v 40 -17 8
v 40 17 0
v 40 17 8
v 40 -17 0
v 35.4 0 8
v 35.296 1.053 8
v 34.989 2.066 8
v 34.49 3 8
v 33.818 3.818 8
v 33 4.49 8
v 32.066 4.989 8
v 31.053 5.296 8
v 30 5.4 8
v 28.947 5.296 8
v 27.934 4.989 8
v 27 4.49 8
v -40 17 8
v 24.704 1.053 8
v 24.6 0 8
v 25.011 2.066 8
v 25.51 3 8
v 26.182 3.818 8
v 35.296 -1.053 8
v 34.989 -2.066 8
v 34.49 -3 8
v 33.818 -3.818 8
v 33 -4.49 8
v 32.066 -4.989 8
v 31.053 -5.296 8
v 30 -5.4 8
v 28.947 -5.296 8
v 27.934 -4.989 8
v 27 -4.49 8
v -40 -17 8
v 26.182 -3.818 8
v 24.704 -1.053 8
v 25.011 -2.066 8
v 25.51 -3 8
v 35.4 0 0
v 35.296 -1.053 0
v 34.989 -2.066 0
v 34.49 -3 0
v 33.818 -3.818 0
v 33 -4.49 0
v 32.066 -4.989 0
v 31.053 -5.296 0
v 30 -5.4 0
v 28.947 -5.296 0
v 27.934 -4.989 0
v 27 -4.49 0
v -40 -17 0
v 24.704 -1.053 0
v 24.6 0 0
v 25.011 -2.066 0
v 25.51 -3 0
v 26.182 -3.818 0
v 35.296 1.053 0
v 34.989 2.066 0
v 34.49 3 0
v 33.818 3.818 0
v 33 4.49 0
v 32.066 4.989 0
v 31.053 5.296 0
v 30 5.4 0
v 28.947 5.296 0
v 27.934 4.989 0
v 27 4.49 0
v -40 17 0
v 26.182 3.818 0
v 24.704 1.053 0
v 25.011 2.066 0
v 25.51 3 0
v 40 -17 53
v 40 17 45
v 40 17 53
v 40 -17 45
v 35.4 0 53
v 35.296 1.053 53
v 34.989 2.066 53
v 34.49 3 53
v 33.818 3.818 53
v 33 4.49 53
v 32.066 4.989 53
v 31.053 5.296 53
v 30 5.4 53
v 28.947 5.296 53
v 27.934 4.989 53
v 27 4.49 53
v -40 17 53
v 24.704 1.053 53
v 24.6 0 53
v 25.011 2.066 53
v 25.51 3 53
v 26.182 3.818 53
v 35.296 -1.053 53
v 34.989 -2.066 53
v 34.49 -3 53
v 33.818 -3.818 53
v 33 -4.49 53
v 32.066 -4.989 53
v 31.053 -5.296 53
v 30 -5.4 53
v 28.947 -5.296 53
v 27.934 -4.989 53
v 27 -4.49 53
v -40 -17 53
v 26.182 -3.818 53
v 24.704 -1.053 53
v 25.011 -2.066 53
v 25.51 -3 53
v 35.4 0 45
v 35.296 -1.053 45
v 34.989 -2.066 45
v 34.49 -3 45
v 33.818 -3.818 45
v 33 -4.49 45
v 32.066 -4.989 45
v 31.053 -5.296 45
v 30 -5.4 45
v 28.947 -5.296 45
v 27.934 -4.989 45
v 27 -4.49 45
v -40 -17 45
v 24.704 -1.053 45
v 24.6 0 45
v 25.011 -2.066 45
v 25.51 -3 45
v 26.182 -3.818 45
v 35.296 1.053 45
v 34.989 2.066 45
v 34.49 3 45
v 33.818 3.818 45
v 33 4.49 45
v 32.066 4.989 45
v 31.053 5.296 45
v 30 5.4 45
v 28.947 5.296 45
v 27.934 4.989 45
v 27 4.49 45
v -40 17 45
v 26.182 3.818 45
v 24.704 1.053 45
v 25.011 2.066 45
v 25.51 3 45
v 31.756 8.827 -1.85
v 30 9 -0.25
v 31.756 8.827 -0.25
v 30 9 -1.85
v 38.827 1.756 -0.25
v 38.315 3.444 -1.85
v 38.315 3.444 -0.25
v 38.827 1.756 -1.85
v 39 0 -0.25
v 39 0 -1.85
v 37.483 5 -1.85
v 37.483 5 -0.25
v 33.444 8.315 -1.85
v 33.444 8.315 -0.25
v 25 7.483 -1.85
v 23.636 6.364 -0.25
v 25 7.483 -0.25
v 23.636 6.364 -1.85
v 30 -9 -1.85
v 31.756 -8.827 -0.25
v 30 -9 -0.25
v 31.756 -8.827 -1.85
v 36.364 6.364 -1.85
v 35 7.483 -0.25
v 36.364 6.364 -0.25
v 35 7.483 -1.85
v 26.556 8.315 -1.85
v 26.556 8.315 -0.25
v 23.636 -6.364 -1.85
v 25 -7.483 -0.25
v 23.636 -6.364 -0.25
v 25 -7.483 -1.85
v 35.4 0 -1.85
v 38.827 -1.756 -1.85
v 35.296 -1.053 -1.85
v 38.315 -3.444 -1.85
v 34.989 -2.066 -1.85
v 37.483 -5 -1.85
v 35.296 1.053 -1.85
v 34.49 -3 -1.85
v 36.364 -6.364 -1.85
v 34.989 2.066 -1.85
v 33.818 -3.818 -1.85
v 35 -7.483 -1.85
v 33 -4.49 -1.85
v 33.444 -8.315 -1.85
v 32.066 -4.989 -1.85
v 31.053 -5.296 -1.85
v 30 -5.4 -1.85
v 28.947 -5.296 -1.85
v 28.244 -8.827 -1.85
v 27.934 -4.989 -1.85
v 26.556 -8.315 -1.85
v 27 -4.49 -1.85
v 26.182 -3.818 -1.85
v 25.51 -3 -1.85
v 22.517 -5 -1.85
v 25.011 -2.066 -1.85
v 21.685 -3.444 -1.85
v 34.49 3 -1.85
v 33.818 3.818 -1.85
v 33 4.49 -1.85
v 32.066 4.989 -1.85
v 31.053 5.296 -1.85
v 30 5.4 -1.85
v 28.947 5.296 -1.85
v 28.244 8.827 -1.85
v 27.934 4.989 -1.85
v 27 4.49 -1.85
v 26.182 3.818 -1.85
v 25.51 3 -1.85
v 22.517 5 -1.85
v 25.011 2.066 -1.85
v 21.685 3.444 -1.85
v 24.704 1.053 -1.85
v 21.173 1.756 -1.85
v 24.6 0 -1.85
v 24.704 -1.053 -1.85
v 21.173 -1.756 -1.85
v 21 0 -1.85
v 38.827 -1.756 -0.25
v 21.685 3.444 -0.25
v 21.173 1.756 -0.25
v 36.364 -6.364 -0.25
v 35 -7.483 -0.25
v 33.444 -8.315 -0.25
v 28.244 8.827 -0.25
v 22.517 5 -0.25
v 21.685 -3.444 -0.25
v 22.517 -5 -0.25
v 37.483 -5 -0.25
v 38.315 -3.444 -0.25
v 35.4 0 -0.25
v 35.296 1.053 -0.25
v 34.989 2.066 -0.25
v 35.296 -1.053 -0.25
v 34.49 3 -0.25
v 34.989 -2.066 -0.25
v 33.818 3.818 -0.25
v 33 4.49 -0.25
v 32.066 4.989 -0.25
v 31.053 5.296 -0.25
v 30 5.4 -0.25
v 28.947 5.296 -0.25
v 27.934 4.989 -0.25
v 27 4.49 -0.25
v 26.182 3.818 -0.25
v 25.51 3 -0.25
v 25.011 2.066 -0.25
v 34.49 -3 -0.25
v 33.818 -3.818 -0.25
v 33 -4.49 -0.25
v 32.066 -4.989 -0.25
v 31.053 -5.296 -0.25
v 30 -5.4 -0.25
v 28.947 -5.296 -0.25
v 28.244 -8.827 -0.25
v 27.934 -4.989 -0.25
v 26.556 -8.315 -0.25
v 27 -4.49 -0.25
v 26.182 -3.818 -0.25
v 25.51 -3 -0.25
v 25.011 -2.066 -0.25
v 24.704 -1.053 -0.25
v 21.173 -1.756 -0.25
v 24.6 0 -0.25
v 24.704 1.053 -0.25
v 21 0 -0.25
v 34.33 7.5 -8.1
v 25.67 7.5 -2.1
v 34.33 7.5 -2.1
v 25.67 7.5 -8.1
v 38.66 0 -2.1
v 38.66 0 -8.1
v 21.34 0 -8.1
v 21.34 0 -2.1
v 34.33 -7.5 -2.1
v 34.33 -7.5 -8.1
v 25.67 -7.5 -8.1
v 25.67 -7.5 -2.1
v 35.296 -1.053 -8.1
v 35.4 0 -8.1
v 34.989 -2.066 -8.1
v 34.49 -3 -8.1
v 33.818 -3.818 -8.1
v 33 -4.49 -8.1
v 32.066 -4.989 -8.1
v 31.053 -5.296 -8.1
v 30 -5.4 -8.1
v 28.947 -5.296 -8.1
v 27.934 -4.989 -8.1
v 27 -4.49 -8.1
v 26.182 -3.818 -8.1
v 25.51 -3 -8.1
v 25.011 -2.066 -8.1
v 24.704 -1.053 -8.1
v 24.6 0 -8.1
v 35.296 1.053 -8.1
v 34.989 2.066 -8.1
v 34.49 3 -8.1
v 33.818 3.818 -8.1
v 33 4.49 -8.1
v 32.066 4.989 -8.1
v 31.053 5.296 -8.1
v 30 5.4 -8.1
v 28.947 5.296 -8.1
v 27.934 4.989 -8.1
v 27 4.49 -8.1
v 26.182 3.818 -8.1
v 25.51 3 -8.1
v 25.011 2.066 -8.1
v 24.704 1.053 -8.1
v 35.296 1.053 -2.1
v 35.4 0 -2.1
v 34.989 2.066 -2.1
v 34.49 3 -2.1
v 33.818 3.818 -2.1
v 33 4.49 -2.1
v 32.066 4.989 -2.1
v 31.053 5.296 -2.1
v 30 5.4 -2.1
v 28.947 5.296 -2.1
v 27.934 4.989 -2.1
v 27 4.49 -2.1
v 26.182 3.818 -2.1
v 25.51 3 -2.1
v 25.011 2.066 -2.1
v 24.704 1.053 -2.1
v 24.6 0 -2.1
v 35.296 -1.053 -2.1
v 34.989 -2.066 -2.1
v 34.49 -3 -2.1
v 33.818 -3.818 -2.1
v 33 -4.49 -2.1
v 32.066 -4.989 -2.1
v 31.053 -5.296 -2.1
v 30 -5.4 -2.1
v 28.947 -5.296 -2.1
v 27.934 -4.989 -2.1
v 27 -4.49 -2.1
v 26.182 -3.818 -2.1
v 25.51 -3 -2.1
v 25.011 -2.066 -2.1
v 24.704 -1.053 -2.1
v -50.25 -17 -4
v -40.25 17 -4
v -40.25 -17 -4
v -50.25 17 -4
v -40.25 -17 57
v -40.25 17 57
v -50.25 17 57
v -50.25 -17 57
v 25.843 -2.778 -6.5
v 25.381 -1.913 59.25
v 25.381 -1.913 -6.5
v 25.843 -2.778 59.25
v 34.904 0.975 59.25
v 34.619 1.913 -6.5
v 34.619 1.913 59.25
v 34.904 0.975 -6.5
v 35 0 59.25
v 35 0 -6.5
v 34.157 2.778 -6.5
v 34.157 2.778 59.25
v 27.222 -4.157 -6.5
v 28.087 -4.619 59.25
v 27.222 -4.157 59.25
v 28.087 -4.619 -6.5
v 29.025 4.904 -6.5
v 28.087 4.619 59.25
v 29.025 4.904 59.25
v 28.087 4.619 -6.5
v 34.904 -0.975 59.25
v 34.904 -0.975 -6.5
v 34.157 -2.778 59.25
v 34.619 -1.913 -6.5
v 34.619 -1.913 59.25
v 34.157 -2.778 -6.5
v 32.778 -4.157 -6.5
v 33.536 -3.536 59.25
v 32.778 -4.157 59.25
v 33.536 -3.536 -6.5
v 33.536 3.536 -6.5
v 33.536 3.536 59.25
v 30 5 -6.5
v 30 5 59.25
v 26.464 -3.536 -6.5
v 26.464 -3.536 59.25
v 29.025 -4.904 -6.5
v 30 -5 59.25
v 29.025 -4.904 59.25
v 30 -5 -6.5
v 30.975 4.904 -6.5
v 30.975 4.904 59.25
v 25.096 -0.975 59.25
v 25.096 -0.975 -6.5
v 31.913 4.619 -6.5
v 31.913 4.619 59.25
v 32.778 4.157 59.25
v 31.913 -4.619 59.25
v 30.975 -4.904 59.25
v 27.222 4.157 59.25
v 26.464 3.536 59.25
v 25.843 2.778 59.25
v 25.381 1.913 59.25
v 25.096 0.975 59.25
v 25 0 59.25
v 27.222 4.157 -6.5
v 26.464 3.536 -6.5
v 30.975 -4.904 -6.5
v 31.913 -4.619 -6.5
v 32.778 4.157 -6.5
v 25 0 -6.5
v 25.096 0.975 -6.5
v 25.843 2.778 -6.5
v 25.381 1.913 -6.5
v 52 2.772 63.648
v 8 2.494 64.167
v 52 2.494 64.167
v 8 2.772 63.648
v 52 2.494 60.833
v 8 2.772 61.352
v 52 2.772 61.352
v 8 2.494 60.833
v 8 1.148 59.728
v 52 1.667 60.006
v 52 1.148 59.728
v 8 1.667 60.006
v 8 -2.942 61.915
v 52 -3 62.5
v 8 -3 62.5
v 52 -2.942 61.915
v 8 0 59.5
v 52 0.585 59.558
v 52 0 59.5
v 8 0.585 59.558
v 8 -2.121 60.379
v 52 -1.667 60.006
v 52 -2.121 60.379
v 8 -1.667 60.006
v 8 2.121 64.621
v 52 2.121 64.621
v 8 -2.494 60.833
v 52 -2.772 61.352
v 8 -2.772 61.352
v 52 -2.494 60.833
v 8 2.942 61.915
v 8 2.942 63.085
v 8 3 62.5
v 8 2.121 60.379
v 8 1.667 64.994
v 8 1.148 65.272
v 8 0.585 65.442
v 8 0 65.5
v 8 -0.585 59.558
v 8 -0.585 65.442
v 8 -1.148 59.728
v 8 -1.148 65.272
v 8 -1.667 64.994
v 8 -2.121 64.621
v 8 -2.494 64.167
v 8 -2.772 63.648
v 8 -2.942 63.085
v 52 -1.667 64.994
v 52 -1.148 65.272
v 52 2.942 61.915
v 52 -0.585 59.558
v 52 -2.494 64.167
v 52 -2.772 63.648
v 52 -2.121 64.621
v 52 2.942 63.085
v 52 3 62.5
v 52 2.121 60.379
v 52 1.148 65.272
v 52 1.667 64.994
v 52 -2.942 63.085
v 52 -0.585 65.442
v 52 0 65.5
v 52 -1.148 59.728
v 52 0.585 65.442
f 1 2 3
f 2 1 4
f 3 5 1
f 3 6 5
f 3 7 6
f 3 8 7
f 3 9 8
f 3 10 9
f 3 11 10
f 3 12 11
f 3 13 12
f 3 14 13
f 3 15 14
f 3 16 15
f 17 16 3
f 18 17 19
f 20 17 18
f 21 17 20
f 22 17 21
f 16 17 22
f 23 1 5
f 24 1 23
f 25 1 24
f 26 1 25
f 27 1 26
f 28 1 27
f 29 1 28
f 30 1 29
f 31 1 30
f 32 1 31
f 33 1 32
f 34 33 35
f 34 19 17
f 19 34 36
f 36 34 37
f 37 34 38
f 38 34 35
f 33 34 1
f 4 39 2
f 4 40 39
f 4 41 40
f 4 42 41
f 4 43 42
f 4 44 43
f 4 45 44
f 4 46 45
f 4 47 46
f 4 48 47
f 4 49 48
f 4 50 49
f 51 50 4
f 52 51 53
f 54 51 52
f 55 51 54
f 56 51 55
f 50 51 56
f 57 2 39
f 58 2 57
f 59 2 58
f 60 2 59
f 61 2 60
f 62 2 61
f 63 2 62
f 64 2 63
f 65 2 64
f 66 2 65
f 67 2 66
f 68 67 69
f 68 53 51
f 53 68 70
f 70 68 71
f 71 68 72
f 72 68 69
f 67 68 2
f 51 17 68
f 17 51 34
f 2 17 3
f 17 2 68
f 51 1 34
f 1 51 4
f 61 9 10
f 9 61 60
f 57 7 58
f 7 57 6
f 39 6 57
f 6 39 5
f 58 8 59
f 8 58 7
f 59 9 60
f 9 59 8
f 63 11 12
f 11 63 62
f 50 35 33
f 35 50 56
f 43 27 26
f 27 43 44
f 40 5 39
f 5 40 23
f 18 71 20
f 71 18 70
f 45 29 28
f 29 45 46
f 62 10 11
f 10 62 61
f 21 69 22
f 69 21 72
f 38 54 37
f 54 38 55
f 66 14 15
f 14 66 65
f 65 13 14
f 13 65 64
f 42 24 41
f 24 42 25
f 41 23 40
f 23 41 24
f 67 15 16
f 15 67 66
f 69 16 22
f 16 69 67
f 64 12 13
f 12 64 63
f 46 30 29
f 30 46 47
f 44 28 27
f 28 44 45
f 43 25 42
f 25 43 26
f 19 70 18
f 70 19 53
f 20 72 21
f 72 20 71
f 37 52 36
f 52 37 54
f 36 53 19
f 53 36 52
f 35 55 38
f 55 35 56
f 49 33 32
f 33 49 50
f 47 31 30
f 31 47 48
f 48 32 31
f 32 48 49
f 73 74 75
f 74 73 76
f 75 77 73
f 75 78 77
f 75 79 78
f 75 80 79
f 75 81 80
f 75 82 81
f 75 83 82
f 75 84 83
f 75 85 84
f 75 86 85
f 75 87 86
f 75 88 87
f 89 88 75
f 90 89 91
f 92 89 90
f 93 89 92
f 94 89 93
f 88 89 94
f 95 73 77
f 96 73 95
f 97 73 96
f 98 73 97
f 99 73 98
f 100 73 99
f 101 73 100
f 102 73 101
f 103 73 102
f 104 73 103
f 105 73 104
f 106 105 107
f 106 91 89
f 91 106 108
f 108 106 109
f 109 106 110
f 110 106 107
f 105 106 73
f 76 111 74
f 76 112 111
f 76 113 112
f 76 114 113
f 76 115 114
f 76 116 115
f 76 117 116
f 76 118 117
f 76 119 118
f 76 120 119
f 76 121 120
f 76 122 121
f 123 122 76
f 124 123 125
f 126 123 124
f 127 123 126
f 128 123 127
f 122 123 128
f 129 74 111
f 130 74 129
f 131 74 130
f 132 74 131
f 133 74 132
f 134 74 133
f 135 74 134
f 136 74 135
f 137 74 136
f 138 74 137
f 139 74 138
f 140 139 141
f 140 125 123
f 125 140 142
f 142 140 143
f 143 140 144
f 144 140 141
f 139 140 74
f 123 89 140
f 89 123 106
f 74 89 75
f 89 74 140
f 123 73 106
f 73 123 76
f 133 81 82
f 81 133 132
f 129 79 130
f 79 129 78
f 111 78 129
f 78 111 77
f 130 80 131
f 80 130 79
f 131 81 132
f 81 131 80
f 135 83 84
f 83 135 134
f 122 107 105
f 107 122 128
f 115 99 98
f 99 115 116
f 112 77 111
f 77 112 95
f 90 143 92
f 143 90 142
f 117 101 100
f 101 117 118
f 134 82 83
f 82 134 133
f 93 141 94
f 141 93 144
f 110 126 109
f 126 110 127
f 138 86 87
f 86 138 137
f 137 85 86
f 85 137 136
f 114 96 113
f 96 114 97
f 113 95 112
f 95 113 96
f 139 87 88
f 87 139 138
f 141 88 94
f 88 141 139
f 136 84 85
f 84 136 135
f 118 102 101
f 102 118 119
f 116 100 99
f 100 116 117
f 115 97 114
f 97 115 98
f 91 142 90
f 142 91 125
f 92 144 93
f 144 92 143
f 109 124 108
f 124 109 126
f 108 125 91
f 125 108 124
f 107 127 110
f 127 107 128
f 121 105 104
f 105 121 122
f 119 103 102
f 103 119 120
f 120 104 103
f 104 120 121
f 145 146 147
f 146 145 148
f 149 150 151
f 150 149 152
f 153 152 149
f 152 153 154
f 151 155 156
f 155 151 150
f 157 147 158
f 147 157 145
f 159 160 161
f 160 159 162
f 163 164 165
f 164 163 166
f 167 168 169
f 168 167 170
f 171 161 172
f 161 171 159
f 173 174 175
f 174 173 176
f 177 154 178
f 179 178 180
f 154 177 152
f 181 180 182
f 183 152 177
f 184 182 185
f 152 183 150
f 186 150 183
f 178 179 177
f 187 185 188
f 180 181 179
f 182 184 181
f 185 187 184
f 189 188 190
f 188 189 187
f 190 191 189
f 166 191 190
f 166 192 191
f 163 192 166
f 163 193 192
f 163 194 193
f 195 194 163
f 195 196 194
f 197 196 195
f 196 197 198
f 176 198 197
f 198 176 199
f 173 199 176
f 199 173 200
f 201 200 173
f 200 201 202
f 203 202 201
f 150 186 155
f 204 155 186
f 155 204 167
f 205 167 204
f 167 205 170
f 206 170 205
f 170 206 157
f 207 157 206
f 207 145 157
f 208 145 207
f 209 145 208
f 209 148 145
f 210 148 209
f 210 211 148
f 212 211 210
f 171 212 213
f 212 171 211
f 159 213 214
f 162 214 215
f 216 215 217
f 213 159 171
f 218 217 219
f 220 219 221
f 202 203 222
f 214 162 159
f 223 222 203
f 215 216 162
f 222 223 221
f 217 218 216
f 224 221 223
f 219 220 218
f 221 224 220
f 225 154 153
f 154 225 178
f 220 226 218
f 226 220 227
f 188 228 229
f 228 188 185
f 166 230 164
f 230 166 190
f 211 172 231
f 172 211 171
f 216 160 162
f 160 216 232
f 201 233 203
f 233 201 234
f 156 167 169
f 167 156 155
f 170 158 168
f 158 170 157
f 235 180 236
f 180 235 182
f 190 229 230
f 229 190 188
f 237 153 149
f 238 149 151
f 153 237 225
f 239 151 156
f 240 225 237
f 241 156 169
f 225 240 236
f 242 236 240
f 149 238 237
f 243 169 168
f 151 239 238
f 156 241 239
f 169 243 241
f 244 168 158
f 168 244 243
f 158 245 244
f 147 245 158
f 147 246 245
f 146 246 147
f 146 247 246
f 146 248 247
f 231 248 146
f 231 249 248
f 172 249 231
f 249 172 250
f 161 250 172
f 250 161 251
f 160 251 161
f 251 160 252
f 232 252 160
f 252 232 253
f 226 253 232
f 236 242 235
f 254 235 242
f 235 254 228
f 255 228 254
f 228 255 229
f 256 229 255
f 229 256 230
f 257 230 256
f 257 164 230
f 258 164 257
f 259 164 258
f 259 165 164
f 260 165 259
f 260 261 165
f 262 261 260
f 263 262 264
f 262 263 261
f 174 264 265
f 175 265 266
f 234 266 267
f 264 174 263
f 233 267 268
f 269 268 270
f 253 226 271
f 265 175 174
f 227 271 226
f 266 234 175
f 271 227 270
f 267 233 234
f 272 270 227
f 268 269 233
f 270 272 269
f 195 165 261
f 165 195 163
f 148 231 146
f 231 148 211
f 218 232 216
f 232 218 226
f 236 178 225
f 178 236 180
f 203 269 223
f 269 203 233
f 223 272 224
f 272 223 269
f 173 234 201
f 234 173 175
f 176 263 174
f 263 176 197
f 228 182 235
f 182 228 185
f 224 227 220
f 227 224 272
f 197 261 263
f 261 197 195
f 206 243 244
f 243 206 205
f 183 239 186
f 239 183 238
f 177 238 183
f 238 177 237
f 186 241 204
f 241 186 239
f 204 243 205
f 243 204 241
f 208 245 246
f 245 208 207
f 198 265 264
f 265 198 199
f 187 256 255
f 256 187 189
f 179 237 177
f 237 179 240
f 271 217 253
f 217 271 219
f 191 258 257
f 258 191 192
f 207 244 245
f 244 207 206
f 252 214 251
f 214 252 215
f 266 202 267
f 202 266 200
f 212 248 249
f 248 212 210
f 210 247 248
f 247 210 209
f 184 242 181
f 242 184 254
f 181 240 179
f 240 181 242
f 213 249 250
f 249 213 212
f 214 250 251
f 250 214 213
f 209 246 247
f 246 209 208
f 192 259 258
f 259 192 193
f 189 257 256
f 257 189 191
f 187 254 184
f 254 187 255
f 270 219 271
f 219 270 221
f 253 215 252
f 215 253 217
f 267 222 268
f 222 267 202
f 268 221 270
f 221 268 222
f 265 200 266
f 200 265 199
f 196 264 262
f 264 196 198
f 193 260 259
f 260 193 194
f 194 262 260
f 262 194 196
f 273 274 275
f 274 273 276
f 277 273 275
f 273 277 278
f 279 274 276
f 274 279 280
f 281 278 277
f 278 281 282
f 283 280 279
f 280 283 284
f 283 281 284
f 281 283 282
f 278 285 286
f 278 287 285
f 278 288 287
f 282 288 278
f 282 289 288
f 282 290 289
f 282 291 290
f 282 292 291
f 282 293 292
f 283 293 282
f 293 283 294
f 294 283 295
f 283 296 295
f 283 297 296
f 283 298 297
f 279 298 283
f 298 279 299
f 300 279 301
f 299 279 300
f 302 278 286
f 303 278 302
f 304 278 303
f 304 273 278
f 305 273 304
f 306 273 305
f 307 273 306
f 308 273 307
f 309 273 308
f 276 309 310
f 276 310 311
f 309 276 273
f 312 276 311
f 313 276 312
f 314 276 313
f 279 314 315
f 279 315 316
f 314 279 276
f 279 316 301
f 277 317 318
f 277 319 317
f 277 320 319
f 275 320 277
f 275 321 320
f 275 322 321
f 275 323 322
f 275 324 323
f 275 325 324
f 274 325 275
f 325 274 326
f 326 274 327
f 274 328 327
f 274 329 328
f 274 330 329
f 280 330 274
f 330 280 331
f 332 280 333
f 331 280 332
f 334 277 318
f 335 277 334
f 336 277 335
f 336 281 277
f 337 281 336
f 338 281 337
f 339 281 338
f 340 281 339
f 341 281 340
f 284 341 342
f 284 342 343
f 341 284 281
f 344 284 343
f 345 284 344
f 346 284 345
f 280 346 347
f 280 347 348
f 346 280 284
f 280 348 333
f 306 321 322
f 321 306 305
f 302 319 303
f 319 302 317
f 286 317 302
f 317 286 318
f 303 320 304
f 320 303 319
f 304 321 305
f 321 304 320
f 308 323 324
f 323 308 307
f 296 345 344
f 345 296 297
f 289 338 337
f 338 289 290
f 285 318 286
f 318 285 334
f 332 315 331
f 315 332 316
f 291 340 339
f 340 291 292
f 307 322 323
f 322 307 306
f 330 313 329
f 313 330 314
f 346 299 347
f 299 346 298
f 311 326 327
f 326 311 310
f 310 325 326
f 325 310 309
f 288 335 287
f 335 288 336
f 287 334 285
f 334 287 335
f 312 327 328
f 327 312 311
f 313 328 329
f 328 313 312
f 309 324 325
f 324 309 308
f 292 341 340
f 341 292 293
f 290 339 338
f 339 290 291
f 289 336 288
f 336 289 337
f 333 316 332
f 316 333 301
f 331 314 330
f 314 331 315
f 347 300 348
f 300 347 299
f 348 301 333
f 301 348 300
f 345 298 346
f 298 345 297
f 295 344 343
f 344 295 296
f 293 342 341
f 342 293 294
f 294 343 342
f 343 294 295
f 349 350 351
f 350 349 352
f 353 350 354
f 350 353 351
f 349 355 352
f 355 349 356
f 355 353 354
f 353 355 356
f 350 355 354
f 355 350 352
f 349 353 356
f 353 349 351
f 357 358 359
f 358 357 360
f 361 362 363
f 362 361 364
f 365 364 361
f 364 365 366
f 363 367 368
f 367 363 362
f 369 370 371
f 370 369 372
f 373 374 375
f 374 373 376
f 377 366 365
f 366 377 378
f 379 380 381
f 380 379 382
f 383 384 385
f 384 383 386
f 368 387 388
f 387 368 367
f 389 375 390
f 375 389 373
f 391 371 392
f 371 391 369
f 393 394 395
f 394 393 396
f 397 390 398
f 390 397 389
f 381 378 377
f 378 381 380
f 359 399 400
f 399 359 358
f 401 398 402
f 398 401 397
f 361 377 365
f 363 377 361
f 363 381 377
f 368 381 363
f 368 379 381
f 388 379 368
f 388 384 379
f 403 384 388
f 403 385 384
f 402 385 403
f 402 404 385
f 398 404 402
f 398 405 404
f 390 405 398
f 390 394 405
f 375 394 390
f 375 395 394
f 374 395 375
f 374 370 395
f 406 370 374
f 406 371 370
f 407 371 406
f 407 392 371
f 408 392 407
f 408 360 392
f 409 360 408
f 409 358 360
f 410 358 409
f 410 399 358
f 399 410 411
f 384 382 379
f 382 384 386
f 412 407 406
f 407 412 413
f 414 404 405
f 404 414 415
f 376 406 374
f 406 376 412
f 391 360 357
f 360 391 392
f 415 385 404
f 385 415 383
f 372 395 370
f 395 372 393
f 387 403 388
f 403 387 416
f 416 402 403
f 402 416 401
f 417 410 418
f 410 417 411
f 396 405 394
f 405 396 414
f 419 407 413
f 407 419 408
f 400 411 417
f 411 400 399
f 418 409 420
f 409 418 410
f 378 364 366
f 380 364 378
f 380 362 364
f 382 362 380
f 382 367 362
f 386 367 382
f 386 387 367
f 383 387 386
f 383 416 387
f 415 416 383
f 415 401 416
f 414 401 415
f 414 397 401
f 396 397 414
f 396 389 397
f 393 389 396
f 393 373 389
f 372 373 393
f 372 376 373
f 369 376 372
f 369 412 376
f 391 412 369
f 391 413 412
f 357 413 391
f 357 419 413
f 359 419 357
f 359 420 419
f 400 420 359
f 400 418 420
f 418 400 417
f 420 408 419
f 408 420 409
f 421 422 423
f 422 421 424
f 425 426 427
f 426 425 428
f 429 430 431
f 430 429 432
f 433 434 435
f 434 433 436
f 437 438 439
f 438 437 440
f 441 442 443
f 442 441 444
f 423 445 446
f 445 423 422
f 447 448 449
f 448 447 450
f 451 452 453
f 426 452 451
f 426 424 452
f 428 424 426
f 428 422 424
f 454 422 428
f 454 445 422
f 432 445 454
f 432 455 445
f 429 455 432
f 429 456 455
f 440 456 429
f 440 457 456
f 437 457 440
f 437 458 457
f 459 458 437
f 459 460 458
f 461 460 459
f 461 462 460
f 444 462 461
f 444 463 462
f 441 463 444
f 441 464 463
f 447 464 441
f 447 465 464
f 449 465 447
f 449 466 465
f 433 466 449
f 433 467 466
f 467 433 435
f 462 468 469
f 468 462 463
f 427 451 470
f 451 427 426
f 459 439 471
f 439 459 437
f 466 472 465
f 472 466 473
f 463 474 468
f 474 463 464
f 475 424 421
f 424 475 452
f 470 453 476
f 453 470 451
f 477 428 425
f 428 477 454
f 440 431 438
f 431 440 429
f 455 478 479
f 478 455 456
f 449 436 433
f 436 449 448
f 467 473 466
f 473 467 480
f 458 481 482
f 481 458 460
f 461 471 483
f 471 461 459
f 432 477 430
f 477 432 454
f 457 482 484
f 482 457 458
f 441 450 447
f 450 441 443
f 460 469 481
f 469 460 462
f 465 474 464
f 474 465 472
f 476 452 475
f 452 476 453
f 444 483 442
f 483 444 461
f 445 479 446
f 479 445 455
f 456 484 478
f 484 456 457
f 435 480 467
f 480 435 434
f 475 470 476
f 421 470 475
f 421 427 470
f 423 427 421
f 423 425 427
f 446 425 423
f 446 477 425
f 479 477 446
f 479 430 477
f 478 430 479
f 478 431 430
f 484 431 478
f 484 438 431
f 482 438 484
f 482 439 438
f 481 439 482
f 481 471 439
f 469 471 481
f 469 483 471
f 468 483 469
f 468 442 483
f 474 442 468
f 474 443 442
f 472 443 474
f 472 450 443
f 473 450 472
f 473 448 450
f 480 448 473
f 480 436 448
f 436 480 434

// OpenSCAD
$fn = 32;

// ------------------------------------------------------------------------
// C clamp: throat 45 mm, screw d10
// Every part is its own module, assembly() places every instance.
// ------------------------------------------------------------------------

// --- part 1 ---
module clamp_arm() {
  difference() {
    translate([-40, -17, 0]) cube([80, 34, 8]);
    translate([30, 0, -1]) cylinder(h = 10, d = 10.8);
  }
}

// --- part 2 ---
module clamp_spine() {
  difference() {
    translate([-30.5, -17, 0]) cube([61, 34, 10]);
  }
}

// --- part 3 ---
module clamp_screw() {
  translate([0, 0, -32.875]) cylinder(h = 65.75, d = 10);
}

// --- part 4 ---
module clamp_washer() {
  difference() {
      translate([0, 0, 0]) cylinder(h = 1.6, d = 18);
      translate([0, 0, -1]) cylinder(h = 3.6, d = 10.8);
    }
}

// --- part 5 ---
module clamp_nut() {
  difference() {
    linear_extrude(height = 6) polygon(points = [[8.66, 0], [4.33, 7.5], [-4.33, 7.5], [-8.66, 0], [-4.33, -7.5], [4.33, -7.5]]);
    translate([0, 0, -1]) cylinder(h = 8, d = 10.8);
  }
}

// --- part 6 ---
module tommy_bar() {
  translate([0, 0, -22]) cylinder(h = 44, d = 6);
}

// --- assembly ---
module assembly() {
  color([0.80, 0.24, 0.20]) translate([0, 0, 0]) rotate([0, 0, 0]) clamp_arm();
  color([0.20, 0.45, 0.75]) translate([0, 0, 45]) rotate([0, 0, 0]) clamp_arm();
  color([0.25, 0.62, 0.32]) translate([-50.25, 0, 26.5]) rotate([0, 90, 0]) clamp_spine();
  color([0.92, 0.70, 0.18]) translate([30, 0, 26.375]) rotate([0, 0, 0]) clamp_screw();
  color([0.58, 0.35, 0.70]) translate([30, 0, -1.85]) rotate([0, 0, 0]) clamp_washer();
  color([0.16, 0.66, 0.66]) translate([30, 0, -8.1]) rotate([0, 0, 0]) clamp_nut();
  color([0.85, 0.48, 0.18]) translate([30, 0, 62.5]) rotate([0, 90, 0]) tommy_bar();
}

assembly();
